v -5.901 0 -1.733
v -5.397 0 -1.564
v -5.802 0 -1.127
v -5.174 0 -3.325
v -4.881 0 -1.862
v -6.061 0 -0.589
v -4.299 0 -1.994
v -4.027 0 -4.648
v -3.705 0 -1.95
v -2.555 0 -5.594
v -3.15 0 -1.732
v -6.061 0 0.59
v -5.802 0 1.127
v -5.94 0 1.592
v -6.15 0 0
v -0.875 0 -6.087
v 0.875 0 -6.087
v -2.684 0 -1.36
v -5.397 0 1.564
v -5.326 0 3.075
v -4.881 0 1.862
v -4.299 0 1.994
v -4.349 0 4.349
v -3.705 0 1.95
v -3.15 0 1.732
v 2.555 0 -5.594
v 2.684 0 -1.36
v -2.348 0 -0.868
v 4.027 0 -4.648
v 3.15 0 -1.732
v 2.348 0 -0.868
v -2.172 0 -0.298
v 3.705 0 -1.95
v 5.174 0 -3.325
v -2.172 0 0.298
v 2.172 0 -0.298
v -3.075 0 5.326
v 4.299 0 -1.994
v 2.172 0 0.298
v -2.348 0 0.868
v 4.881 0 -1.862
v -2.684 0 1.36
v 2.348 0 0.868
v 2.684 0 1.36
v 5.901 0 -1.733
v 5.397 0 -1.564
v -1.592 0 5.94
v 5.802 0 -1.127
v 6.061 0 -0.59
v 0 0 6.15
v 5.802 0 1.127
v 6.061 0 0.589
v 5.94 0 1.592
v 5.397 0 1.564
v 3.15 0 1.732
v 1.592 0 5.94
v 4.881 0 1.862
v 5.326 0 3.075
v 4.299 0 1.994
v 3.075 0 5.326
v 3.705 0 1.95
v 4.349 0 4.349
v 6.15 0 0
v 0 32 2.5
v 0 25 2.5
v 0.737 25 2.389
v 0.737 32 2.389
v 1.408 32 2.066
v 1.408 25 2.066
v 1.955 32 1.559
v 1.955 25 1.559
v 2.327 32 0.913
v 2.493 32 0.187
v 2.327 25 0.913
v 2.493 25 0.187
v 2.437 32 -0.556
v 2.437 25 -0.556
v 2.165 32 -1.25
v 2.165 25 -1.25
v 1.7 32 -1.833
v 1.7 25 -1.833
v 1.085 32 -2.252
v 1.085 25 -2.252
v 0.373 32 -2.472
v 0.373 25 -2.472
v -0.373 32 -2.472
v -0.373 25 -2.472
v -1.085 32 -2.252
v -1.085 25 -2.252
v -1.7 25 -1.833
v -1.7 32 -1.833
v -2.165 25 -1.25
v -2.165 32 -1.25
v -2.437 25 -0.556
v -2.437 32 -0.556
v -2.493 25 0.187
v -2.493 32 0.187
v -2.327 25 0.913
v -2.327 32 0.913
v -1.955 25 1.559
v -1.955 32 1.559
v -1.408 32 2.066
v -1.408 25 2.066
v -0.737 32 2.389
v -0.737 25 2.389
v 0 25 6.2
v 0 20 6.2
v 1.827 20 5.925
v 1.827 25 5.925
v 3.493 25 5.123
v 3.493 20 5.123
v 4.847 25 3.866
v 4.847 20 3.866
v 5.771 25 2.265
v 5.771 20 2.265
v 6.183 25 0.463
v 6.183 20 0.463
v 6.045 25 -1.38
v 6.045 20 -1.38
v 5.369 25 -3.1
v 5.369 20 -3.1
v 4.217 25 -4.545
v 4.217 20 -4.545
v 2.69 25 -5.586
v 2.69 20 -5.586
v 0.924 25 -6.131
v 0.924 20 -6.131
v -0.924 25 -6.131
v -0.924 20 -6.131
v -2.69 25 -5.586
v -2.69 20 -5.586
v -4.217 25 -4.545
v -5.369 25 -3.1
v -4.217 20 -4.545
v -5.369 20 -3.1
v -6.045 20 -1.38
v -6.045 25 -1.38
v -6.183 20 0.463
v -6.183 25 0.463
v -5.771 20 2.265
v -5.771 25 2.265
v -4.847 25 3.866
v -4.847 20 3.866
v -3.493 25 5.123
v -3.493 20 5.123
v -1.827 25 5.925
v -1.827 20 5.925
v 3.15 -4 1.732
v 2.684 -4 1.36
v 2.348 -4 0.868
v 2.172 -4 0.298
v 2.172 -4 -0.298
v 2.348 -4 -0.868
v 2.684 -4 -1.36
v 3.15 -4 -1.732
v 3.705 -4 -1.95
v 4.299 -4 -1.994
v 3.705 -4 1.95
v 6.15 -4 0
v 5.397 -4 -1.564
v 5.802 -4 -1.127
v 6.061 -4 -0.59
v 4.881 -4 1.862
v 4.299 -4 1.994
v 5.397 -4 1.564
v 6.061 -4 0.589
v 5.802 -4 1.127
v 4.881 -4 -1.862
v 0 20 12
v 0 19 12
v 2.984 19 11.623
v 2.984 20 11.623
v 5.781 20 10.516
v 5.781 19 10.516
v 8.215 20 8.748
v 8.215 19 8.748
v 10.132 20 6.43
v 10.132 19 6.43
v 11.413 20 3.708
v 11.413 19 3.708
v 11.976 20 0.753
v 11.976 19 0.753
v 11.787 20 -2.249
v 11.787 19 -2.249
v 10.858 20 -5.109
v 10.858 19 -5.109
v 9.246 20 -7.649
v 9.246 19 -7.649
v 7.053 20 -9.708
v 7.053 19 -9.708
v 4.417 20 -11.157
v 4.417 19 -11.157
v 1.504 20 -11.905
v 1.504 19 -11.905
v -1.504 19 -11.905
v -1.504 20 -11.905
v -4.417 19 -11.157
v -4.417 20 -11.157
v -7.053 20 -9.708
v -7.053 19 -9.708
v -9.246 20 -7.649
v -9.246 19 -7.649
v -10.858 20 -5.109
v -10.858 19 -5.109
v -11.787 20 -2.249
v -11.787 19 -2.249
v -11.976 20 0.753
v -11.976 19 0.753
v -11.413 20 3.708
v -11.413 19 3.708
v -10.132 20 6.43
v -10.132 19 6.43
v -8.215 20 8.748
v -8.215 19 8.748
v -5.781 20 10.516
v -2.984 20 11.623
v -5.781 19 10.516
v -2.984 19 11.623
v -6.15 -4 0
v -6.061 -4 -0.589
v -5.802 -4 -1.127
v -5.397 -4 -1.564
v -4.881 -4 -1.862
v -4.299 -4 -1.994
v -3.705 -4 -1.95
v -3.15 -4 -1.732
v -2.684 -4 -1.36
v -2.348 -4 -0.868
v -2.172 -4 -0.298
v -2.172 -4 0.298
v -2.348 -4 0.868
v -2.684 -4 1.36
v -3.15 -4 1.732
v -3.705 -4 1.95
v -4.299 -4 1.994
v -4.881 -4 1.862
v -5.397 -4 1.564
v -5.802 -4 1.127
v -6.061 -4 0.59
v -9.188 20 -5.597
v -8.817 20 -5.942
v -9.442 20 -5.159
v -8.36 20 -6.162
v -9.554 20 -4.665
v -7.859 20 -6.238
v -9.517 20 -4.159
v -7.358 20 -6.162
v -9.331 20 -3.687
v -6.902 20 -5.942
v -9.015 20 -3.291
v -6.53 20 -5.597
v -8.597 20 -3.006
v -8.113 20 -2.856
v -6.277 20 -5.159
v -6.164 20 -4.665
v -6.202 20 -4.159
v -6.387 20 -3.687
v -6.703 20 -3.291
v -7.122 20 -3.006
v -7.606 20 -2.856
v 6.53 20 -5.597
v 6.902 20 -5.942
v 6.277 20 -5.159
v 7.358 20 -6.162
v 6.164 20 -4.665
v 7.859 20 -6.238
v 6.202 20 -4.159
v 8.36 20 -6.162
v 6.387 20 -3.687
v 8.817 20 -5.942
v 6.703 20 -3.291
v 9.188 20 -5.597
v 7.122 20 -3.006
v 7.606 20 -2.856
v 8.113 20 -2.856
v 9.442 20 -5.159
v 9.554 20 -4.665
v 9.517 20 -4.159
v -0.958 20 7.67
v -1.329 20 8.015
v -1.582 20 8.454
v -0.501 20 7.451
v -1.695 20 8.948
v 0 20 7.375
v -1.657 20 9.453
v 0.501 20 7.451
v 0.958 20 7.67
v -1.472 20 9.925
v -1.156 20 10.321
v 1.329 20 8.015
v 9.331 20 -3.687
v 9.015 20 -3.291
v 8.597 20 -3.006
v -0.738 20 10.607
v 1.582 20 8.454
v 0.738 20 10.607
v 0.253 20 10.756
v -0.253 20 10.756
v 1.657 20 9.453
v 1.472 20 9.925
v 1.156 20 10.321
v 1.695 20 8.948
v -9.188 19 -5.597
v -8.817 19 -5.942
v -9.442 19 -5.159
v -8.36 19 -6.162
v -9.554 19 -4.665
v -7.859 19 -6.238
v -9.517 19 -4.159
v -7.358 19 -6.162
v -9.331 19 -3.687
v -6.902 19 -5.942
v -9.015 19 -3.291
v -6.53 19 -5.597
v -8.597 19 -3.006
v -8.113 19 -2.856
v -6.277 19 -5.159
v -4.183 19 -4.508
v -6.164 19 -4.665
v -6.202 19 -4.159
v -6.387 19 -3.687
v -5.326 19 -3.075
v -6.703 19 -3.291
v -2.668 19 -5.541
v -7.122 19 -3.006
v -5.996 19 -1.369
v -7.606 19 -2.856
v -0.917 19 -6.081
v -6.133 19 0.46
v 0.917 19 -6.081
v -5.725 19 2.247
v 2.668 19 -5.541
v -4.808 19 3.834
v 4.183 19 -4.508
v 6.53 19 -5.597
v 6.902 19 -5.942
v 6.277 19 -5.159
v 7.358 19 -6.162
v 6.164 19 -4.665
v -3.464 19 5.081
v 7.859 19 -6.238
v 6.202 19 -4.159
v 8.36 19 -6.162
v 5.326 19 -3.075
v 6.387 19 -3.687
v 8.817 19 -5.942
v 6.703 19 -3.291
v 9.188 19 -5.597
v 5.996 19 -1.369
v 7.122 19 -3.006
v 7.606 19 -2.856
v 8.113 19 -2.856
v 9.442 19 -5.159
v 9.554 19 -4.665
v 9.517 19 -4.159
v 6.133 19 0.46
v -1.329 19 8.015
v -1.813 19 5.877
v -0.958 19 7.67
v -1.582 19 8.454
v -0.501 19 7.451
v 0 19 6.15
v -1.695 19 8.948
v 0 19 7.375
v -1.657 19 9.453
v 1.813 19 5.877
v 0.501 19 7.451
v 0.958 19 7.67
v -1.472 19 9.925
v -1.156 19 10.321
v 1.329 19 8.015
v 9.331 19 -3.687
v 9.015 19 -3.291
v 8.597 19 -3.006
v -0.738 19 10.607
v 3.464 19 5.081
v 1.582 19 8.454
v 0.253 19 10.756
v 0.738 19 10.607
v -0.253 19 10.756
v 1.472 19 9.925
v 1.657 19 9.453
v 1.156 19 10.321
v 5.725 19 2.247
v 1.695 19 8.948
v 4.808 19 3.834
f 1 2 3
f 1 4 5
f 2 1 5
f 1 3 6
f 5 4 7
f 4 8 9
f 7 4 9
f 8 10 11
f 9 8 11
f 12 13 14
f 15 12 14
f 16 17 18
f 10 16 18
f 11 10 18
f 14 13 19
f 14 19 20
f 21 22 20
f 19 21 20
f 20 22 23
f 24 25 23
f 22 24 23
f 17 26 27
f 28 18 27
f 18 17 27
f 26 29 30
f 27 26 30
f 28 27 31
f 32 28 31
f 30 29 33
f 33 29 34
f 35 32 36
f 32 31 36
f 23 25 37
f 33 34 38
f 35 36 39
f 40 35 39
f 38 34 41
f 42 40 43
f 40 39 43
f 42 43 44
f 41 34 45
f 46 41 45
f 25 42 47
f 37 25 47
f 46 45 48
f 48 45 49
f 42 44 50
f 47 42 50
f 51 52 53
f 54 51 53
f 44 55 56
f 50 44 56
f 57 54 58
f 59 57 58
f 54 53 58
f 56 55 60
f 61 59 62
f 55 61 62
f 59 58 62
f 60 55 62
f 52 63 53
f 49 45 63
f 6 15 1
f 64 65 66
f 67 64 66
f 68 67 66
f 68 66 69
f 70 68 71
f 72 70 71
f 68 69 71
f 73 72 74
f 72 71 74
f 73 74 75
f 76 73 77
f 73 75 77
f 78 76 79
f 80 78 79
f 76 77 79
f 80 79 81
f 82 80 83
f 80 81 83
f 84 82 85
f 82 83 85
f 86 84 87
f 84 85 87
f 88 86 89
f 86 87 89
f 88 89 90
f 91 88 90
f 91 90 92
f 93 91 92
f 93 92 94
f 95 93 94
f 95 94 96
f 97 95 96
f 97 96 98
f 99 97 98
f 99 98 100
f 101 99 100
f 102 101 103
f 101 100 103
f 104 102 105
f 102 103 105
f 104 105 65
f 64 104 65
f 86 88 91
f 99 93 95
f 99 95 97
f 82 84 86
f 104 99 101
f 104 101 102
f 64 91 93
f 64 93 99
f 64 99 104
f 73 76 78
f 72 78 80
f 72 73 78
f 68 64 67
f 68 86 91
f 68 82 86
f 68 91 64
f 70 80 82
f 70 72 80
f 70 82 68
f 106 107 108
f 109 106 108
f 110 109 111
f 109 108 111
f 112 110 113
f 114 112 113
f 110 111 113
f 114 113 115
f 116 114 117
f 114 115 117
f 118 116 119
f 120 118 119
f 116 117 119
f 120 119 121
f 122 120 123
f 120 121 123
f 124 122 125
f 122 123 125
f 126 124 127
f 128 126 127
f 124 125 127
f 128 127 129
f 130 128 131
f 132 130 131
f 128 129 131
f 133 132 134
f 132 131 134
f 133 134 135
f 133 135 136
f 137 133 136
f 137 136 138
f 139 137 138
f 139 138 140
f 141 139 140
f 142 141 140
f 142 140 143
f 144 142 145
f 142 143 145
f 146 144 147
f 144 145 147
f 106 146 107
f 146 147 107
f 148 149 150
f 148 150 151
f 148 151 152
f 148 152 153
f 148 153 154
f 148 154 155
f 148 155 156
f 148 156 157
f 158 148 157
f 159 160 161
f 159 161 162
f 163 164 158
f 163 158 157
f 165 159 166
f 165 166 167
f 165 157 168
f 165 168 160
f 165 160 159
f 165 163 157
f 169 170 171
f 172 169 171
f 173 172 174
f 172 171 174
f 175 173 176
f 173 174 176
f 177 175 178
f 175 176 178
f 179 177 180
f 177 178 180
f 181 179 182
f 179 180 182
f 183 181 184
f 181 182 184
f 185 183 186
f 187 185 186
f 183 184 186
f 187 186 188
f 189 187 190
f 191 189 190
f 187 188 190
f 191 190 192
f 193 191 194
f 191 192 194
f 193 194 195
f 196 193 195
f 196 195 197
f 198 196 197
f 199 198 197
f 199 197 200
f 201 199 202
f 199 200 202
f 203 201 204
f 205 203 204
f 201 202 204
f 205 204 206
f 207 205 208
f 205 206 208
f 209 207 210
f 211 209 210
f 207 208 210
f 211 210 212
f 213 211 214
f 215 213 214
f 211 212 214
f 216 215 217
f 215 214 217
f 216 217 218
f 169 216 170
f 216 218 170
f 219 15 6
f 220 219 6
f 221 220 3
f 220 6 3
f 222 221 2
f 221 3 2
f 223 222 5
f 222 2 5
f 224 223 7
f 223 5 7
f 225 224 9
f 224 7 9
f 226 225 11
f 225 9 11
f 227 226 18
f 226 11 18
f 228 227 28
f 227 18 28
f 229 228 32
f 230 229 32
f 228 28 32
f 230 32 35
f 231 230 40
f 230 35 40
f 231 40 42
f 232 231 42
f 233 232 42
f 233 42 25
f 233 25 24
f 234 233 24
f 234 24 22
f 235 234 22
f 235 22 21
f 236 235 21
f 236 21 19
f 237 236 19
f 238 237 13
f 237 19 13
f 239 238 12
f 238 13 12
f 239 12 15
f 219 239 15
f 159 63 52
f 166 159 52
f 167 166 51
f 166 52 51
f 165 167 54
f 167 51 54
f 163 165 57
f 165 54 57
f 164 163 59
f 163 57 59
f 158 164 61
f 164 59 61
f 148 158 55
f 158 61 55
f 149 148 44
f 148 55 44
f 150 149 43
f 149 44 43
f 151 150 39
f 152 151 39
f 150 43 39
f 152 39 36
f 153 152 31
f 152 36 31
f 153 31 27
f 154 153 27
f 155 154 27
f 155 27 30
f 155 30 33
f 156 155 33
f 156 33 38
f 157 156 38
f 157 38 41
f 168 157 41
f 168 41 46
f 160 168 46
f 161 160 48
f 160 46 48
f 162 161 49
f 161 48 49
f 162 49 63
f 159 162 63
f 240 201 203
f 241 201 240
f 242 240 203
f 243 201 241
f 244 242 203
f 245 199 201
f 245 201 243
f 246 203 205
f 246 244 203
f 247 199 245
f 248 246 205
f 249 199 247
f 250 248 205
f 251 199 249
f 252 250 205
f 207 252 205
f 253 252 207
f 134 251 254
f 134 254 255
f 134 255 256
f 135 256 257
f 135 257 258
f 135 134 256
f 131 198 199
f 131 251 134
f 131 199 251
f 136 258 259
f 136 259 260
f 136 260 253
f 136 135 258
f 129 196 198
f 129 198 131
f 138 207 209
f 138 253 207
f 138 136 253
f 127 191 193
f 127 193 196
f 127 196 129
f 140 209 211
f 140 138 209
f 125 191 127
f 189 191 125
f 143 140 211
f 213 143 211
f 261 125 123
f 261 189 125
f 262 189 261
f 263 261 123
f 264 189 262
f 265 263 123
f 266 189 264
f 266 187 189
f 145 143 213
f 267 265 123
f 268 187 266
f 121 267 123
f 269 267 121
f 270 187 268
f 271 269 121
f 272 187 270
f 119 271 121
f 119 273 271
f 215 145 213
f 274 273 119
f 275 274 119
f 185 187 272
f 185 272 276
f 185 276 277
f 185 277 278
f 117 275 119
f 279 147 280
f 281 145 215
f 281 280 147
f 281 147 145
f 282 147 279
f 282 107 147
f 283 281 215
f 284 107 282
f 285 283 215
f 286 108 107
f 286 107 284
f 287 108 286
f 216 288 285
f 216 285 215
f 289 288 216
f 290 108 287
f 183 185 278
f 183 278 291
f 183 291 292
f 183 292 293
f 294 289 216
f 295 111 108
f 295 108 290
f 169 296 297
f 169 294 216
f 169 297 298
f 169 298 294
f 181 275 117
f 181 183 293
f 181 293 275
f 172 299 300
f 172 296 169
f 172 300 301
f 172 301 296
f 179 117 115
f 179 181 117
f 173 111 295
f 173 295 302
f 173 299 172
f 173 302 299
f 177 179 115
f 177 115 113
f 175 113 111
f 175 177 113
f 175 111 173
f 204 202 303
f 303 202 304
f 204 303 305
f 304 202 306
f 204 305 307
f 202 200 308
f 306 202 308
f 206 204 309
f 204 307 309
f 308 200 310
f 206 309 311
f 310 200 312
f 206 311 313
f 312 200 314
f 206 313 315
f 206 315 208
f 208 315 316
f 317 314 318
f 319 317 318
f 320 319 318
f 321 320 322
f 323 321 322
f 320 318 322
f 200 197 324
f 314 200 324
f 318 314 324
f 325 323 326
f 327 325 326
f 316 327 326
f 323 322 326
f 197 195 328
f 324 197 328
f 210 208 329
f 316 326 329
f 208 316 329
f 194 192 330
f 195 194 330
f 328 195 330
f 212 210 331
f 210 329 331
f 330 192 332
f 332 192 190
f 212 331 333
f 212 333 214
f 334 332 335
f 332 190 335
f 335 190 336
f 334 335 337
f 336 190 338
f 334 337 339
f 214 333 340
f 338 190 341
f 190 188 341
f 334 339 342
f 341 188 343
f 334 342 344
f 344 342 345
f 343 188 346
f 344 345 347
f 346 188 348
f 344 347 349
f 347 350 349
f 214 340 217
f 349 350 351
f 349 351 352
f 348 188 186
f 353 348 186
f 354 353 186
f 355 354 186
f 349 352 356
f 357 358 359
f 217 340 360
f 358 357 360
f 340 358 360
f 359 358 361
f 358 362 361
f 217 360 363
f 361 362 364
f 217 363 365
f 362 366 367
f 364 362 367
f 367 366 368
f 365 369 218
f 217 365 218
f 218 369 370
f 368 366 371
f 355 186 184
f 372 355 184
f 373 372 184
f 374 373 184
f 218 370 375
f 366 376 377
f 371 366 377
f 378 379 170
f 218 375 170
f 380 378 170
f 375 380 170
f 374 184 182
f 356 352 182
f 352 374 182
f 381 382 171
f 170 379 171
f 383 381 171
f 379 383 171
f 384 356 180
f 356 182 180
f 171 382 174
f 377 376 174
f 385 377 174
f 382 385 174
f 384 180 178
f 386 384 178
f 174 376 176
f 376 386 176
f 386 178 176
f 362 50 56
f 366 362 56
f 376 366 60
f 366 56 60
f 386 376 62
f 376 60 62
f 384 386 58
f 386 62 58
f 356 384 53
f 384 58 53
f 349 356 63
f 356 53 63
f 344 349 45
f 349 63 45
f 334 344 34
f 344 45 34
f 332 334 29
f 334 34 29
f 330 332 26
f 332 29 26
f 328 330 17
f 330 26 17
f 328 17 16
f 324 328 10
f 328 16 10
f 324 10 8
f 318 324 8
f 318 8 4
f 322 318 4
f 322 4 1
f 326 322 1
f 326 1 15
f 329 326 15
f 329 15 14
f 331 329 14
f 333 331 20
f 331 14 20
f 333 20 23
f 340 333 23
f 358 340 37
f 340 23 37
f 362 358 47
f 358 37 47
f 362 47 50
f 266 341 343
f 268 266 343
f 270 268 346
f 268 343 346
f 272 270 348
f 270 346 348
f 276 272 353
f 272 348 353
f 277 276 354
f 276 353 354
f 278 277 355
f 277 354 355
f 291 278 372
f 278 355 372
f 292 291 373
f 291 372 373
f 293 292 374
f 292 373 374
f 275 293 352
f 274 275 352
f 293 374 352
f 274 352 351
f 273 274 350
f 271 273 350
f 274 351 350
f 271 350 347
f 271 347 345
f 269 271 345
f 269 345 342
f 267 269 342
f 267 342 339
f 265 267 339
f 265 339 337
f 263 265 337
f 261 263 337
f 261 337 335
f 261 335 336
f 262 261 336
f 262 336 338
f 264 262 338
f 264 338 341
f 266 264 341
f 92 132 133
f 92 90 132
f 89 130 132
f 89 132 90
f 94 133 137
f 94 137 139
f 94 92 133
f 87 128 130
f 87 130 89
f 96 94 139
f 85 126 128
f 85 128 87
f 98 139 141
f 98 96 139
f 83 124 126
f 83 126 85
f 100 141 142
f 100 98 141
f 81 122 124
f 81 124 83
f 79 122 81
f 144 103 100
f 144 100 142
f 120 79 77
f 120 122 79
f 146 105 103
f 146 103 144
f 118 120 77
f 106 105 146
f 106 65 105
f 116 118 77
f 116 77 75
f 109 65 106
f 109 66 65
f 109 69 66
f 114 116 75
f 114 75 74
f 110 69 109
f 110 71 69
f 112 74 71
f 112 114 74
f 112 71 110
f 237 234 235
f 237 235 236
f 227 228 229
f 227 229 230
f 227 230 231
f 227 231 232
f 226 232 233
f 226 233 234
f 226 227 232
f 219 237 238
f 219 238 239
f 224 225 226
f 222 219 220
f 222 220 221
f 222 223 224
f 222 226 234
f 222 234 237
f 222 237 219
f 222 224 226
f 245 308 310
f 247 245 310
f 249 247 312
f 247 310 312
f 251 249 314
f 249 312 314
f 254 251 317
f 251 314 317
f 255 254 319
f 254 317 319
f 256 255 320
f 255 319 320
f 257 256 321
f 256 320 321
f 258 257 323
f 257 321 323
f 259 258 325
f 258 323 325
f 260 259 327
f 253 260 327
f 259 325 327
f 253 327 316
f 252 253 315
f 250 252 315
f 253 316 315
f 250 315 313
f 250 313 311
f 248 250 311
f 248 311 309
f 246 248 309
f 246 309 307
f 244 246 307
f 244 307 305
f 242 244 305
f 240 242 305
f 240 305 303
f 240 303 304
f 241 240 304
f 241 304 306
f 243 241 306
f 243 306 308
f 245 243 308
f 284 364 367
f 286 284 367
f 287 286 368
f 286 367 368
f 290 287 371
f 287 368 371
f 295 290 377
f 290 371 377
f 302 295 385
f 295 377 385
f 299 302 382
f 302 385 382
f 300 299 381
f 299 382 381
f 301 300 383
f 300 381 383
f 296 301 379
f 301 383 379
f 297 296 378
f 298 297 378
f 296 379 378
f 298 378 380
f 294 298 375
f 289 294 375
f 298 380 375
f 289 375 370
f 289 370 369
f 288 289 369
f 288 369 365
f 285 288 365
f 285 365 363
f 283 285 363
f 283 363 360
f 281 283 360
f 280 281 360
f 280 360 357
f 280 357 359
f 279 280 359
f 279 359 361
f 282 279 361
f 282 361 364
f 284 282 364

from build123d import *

# Parameters (mm, degrees)
SKETCH1_R           = 6.15
BOSS_EXTRUDE1_DEPTH = 19
SKETCH2_R           = 12
BOSS_EXTRUDE2_DEPTH = 1
SKETCH3_R           = 6.2
BOSS_EXTRUDE3_DEPTH = 5
SKETCH4_R           = 2.5
BOSS_EXTRUDE4_DEPTH = 7
SKETCH5_R           = 2
BOSS_EXTRUDE5_DEPTH = 4
SKETCH6_R           = 1.7
CUT_EXTRUDE1_DEPTH  = 29.583211856


with BuildPart() as part:
    # Sketch1 → Boss-Extrude1 (new body)
    with BuildSketch(Plane(origin=(0, 0, 0), x_dir=(1, 0, 0), z_dir=(0, 1, 0))):
        with Locations(Location((0, 0, 0), (0, 0, 270))):
            Circle(SKETCH1_R)
    extrude(amount=BOSS_EXTRUDE1_DEPTH)

    # Sketch2 → Boss-Extrude2 (add)
    with BuildSketch(Plane(origin=(0, 19, 0), x_dir=(1, 0, 0), z_dir=(0, 1, 0))):
        with Locations(Location((0, 0, 0), (0, 0, 270))):
            Circle(SKETCH2_R)
    extrude(amount=BOSS_EXTRUDE2_DEPTH)

    # Sketch3 → Boss-Extrude3 (add)
    with BuildSketch(Plane(origin=(0, 20, 0), x_dir=(1, 0, 0), z_dir=(0, 1, 0))):
        with Locations(Location((0, 0, 0), (0, 0, 270))):
            Circle(SKETCH3_R)
    extrude(amount=BOSS_EXTRUDE3_DEPTH)

    # Sketch4 → Boss-Extrude4 (add)
    with BuildSketch(Plane(origin=(0, 25, 0), x_dir=(1, 0, 0), z_dir=(0, 1, 0))):
        with Locations(Location((0, 0, 0), (0, 0, 270))):
            Circle(SKETCH4_R)
    extrude(amount=BOSS_EXTRUDE4_DEPTH)

    # Sketch5 → Boss-Extrude5 (add)
    with BuildSketch(Plane.XZ):
        with Locations(Location((-4.15, 0, 0), (0, 0, 179.999302513))):
            Circle(SKETCH5_R)
        with Locations(Location((4.15, 0, 0), (0, 0, 359.999302513))):
            Circle(SKETCH5_R)
    extrude(amount=BOSS_EXTRUDE5_DEPTH)

    # Sketch6 → Cut-Extrude1 (cut, through all)
    with BuildSketch(Plane.XZ.offset(-19)):
        with Locations(Location((0, 9.075, 0), (0, 0, 270))):
            Circle(SKETCH6_R)
        with Locations(Location((7.859180539, -4.5375, 0), (0, 0, 270))):
            Circle(SKETCH6_R)
        with Locations(Location((-7.859180539, -4.5375, 0), (0, 0, 270))):
            Circle(SKETCH6_R)
    extrude(amount=-CUT_EXTRUDE1_DEPTH, mode=Mode.SUBTRACT)


solid = part.part
